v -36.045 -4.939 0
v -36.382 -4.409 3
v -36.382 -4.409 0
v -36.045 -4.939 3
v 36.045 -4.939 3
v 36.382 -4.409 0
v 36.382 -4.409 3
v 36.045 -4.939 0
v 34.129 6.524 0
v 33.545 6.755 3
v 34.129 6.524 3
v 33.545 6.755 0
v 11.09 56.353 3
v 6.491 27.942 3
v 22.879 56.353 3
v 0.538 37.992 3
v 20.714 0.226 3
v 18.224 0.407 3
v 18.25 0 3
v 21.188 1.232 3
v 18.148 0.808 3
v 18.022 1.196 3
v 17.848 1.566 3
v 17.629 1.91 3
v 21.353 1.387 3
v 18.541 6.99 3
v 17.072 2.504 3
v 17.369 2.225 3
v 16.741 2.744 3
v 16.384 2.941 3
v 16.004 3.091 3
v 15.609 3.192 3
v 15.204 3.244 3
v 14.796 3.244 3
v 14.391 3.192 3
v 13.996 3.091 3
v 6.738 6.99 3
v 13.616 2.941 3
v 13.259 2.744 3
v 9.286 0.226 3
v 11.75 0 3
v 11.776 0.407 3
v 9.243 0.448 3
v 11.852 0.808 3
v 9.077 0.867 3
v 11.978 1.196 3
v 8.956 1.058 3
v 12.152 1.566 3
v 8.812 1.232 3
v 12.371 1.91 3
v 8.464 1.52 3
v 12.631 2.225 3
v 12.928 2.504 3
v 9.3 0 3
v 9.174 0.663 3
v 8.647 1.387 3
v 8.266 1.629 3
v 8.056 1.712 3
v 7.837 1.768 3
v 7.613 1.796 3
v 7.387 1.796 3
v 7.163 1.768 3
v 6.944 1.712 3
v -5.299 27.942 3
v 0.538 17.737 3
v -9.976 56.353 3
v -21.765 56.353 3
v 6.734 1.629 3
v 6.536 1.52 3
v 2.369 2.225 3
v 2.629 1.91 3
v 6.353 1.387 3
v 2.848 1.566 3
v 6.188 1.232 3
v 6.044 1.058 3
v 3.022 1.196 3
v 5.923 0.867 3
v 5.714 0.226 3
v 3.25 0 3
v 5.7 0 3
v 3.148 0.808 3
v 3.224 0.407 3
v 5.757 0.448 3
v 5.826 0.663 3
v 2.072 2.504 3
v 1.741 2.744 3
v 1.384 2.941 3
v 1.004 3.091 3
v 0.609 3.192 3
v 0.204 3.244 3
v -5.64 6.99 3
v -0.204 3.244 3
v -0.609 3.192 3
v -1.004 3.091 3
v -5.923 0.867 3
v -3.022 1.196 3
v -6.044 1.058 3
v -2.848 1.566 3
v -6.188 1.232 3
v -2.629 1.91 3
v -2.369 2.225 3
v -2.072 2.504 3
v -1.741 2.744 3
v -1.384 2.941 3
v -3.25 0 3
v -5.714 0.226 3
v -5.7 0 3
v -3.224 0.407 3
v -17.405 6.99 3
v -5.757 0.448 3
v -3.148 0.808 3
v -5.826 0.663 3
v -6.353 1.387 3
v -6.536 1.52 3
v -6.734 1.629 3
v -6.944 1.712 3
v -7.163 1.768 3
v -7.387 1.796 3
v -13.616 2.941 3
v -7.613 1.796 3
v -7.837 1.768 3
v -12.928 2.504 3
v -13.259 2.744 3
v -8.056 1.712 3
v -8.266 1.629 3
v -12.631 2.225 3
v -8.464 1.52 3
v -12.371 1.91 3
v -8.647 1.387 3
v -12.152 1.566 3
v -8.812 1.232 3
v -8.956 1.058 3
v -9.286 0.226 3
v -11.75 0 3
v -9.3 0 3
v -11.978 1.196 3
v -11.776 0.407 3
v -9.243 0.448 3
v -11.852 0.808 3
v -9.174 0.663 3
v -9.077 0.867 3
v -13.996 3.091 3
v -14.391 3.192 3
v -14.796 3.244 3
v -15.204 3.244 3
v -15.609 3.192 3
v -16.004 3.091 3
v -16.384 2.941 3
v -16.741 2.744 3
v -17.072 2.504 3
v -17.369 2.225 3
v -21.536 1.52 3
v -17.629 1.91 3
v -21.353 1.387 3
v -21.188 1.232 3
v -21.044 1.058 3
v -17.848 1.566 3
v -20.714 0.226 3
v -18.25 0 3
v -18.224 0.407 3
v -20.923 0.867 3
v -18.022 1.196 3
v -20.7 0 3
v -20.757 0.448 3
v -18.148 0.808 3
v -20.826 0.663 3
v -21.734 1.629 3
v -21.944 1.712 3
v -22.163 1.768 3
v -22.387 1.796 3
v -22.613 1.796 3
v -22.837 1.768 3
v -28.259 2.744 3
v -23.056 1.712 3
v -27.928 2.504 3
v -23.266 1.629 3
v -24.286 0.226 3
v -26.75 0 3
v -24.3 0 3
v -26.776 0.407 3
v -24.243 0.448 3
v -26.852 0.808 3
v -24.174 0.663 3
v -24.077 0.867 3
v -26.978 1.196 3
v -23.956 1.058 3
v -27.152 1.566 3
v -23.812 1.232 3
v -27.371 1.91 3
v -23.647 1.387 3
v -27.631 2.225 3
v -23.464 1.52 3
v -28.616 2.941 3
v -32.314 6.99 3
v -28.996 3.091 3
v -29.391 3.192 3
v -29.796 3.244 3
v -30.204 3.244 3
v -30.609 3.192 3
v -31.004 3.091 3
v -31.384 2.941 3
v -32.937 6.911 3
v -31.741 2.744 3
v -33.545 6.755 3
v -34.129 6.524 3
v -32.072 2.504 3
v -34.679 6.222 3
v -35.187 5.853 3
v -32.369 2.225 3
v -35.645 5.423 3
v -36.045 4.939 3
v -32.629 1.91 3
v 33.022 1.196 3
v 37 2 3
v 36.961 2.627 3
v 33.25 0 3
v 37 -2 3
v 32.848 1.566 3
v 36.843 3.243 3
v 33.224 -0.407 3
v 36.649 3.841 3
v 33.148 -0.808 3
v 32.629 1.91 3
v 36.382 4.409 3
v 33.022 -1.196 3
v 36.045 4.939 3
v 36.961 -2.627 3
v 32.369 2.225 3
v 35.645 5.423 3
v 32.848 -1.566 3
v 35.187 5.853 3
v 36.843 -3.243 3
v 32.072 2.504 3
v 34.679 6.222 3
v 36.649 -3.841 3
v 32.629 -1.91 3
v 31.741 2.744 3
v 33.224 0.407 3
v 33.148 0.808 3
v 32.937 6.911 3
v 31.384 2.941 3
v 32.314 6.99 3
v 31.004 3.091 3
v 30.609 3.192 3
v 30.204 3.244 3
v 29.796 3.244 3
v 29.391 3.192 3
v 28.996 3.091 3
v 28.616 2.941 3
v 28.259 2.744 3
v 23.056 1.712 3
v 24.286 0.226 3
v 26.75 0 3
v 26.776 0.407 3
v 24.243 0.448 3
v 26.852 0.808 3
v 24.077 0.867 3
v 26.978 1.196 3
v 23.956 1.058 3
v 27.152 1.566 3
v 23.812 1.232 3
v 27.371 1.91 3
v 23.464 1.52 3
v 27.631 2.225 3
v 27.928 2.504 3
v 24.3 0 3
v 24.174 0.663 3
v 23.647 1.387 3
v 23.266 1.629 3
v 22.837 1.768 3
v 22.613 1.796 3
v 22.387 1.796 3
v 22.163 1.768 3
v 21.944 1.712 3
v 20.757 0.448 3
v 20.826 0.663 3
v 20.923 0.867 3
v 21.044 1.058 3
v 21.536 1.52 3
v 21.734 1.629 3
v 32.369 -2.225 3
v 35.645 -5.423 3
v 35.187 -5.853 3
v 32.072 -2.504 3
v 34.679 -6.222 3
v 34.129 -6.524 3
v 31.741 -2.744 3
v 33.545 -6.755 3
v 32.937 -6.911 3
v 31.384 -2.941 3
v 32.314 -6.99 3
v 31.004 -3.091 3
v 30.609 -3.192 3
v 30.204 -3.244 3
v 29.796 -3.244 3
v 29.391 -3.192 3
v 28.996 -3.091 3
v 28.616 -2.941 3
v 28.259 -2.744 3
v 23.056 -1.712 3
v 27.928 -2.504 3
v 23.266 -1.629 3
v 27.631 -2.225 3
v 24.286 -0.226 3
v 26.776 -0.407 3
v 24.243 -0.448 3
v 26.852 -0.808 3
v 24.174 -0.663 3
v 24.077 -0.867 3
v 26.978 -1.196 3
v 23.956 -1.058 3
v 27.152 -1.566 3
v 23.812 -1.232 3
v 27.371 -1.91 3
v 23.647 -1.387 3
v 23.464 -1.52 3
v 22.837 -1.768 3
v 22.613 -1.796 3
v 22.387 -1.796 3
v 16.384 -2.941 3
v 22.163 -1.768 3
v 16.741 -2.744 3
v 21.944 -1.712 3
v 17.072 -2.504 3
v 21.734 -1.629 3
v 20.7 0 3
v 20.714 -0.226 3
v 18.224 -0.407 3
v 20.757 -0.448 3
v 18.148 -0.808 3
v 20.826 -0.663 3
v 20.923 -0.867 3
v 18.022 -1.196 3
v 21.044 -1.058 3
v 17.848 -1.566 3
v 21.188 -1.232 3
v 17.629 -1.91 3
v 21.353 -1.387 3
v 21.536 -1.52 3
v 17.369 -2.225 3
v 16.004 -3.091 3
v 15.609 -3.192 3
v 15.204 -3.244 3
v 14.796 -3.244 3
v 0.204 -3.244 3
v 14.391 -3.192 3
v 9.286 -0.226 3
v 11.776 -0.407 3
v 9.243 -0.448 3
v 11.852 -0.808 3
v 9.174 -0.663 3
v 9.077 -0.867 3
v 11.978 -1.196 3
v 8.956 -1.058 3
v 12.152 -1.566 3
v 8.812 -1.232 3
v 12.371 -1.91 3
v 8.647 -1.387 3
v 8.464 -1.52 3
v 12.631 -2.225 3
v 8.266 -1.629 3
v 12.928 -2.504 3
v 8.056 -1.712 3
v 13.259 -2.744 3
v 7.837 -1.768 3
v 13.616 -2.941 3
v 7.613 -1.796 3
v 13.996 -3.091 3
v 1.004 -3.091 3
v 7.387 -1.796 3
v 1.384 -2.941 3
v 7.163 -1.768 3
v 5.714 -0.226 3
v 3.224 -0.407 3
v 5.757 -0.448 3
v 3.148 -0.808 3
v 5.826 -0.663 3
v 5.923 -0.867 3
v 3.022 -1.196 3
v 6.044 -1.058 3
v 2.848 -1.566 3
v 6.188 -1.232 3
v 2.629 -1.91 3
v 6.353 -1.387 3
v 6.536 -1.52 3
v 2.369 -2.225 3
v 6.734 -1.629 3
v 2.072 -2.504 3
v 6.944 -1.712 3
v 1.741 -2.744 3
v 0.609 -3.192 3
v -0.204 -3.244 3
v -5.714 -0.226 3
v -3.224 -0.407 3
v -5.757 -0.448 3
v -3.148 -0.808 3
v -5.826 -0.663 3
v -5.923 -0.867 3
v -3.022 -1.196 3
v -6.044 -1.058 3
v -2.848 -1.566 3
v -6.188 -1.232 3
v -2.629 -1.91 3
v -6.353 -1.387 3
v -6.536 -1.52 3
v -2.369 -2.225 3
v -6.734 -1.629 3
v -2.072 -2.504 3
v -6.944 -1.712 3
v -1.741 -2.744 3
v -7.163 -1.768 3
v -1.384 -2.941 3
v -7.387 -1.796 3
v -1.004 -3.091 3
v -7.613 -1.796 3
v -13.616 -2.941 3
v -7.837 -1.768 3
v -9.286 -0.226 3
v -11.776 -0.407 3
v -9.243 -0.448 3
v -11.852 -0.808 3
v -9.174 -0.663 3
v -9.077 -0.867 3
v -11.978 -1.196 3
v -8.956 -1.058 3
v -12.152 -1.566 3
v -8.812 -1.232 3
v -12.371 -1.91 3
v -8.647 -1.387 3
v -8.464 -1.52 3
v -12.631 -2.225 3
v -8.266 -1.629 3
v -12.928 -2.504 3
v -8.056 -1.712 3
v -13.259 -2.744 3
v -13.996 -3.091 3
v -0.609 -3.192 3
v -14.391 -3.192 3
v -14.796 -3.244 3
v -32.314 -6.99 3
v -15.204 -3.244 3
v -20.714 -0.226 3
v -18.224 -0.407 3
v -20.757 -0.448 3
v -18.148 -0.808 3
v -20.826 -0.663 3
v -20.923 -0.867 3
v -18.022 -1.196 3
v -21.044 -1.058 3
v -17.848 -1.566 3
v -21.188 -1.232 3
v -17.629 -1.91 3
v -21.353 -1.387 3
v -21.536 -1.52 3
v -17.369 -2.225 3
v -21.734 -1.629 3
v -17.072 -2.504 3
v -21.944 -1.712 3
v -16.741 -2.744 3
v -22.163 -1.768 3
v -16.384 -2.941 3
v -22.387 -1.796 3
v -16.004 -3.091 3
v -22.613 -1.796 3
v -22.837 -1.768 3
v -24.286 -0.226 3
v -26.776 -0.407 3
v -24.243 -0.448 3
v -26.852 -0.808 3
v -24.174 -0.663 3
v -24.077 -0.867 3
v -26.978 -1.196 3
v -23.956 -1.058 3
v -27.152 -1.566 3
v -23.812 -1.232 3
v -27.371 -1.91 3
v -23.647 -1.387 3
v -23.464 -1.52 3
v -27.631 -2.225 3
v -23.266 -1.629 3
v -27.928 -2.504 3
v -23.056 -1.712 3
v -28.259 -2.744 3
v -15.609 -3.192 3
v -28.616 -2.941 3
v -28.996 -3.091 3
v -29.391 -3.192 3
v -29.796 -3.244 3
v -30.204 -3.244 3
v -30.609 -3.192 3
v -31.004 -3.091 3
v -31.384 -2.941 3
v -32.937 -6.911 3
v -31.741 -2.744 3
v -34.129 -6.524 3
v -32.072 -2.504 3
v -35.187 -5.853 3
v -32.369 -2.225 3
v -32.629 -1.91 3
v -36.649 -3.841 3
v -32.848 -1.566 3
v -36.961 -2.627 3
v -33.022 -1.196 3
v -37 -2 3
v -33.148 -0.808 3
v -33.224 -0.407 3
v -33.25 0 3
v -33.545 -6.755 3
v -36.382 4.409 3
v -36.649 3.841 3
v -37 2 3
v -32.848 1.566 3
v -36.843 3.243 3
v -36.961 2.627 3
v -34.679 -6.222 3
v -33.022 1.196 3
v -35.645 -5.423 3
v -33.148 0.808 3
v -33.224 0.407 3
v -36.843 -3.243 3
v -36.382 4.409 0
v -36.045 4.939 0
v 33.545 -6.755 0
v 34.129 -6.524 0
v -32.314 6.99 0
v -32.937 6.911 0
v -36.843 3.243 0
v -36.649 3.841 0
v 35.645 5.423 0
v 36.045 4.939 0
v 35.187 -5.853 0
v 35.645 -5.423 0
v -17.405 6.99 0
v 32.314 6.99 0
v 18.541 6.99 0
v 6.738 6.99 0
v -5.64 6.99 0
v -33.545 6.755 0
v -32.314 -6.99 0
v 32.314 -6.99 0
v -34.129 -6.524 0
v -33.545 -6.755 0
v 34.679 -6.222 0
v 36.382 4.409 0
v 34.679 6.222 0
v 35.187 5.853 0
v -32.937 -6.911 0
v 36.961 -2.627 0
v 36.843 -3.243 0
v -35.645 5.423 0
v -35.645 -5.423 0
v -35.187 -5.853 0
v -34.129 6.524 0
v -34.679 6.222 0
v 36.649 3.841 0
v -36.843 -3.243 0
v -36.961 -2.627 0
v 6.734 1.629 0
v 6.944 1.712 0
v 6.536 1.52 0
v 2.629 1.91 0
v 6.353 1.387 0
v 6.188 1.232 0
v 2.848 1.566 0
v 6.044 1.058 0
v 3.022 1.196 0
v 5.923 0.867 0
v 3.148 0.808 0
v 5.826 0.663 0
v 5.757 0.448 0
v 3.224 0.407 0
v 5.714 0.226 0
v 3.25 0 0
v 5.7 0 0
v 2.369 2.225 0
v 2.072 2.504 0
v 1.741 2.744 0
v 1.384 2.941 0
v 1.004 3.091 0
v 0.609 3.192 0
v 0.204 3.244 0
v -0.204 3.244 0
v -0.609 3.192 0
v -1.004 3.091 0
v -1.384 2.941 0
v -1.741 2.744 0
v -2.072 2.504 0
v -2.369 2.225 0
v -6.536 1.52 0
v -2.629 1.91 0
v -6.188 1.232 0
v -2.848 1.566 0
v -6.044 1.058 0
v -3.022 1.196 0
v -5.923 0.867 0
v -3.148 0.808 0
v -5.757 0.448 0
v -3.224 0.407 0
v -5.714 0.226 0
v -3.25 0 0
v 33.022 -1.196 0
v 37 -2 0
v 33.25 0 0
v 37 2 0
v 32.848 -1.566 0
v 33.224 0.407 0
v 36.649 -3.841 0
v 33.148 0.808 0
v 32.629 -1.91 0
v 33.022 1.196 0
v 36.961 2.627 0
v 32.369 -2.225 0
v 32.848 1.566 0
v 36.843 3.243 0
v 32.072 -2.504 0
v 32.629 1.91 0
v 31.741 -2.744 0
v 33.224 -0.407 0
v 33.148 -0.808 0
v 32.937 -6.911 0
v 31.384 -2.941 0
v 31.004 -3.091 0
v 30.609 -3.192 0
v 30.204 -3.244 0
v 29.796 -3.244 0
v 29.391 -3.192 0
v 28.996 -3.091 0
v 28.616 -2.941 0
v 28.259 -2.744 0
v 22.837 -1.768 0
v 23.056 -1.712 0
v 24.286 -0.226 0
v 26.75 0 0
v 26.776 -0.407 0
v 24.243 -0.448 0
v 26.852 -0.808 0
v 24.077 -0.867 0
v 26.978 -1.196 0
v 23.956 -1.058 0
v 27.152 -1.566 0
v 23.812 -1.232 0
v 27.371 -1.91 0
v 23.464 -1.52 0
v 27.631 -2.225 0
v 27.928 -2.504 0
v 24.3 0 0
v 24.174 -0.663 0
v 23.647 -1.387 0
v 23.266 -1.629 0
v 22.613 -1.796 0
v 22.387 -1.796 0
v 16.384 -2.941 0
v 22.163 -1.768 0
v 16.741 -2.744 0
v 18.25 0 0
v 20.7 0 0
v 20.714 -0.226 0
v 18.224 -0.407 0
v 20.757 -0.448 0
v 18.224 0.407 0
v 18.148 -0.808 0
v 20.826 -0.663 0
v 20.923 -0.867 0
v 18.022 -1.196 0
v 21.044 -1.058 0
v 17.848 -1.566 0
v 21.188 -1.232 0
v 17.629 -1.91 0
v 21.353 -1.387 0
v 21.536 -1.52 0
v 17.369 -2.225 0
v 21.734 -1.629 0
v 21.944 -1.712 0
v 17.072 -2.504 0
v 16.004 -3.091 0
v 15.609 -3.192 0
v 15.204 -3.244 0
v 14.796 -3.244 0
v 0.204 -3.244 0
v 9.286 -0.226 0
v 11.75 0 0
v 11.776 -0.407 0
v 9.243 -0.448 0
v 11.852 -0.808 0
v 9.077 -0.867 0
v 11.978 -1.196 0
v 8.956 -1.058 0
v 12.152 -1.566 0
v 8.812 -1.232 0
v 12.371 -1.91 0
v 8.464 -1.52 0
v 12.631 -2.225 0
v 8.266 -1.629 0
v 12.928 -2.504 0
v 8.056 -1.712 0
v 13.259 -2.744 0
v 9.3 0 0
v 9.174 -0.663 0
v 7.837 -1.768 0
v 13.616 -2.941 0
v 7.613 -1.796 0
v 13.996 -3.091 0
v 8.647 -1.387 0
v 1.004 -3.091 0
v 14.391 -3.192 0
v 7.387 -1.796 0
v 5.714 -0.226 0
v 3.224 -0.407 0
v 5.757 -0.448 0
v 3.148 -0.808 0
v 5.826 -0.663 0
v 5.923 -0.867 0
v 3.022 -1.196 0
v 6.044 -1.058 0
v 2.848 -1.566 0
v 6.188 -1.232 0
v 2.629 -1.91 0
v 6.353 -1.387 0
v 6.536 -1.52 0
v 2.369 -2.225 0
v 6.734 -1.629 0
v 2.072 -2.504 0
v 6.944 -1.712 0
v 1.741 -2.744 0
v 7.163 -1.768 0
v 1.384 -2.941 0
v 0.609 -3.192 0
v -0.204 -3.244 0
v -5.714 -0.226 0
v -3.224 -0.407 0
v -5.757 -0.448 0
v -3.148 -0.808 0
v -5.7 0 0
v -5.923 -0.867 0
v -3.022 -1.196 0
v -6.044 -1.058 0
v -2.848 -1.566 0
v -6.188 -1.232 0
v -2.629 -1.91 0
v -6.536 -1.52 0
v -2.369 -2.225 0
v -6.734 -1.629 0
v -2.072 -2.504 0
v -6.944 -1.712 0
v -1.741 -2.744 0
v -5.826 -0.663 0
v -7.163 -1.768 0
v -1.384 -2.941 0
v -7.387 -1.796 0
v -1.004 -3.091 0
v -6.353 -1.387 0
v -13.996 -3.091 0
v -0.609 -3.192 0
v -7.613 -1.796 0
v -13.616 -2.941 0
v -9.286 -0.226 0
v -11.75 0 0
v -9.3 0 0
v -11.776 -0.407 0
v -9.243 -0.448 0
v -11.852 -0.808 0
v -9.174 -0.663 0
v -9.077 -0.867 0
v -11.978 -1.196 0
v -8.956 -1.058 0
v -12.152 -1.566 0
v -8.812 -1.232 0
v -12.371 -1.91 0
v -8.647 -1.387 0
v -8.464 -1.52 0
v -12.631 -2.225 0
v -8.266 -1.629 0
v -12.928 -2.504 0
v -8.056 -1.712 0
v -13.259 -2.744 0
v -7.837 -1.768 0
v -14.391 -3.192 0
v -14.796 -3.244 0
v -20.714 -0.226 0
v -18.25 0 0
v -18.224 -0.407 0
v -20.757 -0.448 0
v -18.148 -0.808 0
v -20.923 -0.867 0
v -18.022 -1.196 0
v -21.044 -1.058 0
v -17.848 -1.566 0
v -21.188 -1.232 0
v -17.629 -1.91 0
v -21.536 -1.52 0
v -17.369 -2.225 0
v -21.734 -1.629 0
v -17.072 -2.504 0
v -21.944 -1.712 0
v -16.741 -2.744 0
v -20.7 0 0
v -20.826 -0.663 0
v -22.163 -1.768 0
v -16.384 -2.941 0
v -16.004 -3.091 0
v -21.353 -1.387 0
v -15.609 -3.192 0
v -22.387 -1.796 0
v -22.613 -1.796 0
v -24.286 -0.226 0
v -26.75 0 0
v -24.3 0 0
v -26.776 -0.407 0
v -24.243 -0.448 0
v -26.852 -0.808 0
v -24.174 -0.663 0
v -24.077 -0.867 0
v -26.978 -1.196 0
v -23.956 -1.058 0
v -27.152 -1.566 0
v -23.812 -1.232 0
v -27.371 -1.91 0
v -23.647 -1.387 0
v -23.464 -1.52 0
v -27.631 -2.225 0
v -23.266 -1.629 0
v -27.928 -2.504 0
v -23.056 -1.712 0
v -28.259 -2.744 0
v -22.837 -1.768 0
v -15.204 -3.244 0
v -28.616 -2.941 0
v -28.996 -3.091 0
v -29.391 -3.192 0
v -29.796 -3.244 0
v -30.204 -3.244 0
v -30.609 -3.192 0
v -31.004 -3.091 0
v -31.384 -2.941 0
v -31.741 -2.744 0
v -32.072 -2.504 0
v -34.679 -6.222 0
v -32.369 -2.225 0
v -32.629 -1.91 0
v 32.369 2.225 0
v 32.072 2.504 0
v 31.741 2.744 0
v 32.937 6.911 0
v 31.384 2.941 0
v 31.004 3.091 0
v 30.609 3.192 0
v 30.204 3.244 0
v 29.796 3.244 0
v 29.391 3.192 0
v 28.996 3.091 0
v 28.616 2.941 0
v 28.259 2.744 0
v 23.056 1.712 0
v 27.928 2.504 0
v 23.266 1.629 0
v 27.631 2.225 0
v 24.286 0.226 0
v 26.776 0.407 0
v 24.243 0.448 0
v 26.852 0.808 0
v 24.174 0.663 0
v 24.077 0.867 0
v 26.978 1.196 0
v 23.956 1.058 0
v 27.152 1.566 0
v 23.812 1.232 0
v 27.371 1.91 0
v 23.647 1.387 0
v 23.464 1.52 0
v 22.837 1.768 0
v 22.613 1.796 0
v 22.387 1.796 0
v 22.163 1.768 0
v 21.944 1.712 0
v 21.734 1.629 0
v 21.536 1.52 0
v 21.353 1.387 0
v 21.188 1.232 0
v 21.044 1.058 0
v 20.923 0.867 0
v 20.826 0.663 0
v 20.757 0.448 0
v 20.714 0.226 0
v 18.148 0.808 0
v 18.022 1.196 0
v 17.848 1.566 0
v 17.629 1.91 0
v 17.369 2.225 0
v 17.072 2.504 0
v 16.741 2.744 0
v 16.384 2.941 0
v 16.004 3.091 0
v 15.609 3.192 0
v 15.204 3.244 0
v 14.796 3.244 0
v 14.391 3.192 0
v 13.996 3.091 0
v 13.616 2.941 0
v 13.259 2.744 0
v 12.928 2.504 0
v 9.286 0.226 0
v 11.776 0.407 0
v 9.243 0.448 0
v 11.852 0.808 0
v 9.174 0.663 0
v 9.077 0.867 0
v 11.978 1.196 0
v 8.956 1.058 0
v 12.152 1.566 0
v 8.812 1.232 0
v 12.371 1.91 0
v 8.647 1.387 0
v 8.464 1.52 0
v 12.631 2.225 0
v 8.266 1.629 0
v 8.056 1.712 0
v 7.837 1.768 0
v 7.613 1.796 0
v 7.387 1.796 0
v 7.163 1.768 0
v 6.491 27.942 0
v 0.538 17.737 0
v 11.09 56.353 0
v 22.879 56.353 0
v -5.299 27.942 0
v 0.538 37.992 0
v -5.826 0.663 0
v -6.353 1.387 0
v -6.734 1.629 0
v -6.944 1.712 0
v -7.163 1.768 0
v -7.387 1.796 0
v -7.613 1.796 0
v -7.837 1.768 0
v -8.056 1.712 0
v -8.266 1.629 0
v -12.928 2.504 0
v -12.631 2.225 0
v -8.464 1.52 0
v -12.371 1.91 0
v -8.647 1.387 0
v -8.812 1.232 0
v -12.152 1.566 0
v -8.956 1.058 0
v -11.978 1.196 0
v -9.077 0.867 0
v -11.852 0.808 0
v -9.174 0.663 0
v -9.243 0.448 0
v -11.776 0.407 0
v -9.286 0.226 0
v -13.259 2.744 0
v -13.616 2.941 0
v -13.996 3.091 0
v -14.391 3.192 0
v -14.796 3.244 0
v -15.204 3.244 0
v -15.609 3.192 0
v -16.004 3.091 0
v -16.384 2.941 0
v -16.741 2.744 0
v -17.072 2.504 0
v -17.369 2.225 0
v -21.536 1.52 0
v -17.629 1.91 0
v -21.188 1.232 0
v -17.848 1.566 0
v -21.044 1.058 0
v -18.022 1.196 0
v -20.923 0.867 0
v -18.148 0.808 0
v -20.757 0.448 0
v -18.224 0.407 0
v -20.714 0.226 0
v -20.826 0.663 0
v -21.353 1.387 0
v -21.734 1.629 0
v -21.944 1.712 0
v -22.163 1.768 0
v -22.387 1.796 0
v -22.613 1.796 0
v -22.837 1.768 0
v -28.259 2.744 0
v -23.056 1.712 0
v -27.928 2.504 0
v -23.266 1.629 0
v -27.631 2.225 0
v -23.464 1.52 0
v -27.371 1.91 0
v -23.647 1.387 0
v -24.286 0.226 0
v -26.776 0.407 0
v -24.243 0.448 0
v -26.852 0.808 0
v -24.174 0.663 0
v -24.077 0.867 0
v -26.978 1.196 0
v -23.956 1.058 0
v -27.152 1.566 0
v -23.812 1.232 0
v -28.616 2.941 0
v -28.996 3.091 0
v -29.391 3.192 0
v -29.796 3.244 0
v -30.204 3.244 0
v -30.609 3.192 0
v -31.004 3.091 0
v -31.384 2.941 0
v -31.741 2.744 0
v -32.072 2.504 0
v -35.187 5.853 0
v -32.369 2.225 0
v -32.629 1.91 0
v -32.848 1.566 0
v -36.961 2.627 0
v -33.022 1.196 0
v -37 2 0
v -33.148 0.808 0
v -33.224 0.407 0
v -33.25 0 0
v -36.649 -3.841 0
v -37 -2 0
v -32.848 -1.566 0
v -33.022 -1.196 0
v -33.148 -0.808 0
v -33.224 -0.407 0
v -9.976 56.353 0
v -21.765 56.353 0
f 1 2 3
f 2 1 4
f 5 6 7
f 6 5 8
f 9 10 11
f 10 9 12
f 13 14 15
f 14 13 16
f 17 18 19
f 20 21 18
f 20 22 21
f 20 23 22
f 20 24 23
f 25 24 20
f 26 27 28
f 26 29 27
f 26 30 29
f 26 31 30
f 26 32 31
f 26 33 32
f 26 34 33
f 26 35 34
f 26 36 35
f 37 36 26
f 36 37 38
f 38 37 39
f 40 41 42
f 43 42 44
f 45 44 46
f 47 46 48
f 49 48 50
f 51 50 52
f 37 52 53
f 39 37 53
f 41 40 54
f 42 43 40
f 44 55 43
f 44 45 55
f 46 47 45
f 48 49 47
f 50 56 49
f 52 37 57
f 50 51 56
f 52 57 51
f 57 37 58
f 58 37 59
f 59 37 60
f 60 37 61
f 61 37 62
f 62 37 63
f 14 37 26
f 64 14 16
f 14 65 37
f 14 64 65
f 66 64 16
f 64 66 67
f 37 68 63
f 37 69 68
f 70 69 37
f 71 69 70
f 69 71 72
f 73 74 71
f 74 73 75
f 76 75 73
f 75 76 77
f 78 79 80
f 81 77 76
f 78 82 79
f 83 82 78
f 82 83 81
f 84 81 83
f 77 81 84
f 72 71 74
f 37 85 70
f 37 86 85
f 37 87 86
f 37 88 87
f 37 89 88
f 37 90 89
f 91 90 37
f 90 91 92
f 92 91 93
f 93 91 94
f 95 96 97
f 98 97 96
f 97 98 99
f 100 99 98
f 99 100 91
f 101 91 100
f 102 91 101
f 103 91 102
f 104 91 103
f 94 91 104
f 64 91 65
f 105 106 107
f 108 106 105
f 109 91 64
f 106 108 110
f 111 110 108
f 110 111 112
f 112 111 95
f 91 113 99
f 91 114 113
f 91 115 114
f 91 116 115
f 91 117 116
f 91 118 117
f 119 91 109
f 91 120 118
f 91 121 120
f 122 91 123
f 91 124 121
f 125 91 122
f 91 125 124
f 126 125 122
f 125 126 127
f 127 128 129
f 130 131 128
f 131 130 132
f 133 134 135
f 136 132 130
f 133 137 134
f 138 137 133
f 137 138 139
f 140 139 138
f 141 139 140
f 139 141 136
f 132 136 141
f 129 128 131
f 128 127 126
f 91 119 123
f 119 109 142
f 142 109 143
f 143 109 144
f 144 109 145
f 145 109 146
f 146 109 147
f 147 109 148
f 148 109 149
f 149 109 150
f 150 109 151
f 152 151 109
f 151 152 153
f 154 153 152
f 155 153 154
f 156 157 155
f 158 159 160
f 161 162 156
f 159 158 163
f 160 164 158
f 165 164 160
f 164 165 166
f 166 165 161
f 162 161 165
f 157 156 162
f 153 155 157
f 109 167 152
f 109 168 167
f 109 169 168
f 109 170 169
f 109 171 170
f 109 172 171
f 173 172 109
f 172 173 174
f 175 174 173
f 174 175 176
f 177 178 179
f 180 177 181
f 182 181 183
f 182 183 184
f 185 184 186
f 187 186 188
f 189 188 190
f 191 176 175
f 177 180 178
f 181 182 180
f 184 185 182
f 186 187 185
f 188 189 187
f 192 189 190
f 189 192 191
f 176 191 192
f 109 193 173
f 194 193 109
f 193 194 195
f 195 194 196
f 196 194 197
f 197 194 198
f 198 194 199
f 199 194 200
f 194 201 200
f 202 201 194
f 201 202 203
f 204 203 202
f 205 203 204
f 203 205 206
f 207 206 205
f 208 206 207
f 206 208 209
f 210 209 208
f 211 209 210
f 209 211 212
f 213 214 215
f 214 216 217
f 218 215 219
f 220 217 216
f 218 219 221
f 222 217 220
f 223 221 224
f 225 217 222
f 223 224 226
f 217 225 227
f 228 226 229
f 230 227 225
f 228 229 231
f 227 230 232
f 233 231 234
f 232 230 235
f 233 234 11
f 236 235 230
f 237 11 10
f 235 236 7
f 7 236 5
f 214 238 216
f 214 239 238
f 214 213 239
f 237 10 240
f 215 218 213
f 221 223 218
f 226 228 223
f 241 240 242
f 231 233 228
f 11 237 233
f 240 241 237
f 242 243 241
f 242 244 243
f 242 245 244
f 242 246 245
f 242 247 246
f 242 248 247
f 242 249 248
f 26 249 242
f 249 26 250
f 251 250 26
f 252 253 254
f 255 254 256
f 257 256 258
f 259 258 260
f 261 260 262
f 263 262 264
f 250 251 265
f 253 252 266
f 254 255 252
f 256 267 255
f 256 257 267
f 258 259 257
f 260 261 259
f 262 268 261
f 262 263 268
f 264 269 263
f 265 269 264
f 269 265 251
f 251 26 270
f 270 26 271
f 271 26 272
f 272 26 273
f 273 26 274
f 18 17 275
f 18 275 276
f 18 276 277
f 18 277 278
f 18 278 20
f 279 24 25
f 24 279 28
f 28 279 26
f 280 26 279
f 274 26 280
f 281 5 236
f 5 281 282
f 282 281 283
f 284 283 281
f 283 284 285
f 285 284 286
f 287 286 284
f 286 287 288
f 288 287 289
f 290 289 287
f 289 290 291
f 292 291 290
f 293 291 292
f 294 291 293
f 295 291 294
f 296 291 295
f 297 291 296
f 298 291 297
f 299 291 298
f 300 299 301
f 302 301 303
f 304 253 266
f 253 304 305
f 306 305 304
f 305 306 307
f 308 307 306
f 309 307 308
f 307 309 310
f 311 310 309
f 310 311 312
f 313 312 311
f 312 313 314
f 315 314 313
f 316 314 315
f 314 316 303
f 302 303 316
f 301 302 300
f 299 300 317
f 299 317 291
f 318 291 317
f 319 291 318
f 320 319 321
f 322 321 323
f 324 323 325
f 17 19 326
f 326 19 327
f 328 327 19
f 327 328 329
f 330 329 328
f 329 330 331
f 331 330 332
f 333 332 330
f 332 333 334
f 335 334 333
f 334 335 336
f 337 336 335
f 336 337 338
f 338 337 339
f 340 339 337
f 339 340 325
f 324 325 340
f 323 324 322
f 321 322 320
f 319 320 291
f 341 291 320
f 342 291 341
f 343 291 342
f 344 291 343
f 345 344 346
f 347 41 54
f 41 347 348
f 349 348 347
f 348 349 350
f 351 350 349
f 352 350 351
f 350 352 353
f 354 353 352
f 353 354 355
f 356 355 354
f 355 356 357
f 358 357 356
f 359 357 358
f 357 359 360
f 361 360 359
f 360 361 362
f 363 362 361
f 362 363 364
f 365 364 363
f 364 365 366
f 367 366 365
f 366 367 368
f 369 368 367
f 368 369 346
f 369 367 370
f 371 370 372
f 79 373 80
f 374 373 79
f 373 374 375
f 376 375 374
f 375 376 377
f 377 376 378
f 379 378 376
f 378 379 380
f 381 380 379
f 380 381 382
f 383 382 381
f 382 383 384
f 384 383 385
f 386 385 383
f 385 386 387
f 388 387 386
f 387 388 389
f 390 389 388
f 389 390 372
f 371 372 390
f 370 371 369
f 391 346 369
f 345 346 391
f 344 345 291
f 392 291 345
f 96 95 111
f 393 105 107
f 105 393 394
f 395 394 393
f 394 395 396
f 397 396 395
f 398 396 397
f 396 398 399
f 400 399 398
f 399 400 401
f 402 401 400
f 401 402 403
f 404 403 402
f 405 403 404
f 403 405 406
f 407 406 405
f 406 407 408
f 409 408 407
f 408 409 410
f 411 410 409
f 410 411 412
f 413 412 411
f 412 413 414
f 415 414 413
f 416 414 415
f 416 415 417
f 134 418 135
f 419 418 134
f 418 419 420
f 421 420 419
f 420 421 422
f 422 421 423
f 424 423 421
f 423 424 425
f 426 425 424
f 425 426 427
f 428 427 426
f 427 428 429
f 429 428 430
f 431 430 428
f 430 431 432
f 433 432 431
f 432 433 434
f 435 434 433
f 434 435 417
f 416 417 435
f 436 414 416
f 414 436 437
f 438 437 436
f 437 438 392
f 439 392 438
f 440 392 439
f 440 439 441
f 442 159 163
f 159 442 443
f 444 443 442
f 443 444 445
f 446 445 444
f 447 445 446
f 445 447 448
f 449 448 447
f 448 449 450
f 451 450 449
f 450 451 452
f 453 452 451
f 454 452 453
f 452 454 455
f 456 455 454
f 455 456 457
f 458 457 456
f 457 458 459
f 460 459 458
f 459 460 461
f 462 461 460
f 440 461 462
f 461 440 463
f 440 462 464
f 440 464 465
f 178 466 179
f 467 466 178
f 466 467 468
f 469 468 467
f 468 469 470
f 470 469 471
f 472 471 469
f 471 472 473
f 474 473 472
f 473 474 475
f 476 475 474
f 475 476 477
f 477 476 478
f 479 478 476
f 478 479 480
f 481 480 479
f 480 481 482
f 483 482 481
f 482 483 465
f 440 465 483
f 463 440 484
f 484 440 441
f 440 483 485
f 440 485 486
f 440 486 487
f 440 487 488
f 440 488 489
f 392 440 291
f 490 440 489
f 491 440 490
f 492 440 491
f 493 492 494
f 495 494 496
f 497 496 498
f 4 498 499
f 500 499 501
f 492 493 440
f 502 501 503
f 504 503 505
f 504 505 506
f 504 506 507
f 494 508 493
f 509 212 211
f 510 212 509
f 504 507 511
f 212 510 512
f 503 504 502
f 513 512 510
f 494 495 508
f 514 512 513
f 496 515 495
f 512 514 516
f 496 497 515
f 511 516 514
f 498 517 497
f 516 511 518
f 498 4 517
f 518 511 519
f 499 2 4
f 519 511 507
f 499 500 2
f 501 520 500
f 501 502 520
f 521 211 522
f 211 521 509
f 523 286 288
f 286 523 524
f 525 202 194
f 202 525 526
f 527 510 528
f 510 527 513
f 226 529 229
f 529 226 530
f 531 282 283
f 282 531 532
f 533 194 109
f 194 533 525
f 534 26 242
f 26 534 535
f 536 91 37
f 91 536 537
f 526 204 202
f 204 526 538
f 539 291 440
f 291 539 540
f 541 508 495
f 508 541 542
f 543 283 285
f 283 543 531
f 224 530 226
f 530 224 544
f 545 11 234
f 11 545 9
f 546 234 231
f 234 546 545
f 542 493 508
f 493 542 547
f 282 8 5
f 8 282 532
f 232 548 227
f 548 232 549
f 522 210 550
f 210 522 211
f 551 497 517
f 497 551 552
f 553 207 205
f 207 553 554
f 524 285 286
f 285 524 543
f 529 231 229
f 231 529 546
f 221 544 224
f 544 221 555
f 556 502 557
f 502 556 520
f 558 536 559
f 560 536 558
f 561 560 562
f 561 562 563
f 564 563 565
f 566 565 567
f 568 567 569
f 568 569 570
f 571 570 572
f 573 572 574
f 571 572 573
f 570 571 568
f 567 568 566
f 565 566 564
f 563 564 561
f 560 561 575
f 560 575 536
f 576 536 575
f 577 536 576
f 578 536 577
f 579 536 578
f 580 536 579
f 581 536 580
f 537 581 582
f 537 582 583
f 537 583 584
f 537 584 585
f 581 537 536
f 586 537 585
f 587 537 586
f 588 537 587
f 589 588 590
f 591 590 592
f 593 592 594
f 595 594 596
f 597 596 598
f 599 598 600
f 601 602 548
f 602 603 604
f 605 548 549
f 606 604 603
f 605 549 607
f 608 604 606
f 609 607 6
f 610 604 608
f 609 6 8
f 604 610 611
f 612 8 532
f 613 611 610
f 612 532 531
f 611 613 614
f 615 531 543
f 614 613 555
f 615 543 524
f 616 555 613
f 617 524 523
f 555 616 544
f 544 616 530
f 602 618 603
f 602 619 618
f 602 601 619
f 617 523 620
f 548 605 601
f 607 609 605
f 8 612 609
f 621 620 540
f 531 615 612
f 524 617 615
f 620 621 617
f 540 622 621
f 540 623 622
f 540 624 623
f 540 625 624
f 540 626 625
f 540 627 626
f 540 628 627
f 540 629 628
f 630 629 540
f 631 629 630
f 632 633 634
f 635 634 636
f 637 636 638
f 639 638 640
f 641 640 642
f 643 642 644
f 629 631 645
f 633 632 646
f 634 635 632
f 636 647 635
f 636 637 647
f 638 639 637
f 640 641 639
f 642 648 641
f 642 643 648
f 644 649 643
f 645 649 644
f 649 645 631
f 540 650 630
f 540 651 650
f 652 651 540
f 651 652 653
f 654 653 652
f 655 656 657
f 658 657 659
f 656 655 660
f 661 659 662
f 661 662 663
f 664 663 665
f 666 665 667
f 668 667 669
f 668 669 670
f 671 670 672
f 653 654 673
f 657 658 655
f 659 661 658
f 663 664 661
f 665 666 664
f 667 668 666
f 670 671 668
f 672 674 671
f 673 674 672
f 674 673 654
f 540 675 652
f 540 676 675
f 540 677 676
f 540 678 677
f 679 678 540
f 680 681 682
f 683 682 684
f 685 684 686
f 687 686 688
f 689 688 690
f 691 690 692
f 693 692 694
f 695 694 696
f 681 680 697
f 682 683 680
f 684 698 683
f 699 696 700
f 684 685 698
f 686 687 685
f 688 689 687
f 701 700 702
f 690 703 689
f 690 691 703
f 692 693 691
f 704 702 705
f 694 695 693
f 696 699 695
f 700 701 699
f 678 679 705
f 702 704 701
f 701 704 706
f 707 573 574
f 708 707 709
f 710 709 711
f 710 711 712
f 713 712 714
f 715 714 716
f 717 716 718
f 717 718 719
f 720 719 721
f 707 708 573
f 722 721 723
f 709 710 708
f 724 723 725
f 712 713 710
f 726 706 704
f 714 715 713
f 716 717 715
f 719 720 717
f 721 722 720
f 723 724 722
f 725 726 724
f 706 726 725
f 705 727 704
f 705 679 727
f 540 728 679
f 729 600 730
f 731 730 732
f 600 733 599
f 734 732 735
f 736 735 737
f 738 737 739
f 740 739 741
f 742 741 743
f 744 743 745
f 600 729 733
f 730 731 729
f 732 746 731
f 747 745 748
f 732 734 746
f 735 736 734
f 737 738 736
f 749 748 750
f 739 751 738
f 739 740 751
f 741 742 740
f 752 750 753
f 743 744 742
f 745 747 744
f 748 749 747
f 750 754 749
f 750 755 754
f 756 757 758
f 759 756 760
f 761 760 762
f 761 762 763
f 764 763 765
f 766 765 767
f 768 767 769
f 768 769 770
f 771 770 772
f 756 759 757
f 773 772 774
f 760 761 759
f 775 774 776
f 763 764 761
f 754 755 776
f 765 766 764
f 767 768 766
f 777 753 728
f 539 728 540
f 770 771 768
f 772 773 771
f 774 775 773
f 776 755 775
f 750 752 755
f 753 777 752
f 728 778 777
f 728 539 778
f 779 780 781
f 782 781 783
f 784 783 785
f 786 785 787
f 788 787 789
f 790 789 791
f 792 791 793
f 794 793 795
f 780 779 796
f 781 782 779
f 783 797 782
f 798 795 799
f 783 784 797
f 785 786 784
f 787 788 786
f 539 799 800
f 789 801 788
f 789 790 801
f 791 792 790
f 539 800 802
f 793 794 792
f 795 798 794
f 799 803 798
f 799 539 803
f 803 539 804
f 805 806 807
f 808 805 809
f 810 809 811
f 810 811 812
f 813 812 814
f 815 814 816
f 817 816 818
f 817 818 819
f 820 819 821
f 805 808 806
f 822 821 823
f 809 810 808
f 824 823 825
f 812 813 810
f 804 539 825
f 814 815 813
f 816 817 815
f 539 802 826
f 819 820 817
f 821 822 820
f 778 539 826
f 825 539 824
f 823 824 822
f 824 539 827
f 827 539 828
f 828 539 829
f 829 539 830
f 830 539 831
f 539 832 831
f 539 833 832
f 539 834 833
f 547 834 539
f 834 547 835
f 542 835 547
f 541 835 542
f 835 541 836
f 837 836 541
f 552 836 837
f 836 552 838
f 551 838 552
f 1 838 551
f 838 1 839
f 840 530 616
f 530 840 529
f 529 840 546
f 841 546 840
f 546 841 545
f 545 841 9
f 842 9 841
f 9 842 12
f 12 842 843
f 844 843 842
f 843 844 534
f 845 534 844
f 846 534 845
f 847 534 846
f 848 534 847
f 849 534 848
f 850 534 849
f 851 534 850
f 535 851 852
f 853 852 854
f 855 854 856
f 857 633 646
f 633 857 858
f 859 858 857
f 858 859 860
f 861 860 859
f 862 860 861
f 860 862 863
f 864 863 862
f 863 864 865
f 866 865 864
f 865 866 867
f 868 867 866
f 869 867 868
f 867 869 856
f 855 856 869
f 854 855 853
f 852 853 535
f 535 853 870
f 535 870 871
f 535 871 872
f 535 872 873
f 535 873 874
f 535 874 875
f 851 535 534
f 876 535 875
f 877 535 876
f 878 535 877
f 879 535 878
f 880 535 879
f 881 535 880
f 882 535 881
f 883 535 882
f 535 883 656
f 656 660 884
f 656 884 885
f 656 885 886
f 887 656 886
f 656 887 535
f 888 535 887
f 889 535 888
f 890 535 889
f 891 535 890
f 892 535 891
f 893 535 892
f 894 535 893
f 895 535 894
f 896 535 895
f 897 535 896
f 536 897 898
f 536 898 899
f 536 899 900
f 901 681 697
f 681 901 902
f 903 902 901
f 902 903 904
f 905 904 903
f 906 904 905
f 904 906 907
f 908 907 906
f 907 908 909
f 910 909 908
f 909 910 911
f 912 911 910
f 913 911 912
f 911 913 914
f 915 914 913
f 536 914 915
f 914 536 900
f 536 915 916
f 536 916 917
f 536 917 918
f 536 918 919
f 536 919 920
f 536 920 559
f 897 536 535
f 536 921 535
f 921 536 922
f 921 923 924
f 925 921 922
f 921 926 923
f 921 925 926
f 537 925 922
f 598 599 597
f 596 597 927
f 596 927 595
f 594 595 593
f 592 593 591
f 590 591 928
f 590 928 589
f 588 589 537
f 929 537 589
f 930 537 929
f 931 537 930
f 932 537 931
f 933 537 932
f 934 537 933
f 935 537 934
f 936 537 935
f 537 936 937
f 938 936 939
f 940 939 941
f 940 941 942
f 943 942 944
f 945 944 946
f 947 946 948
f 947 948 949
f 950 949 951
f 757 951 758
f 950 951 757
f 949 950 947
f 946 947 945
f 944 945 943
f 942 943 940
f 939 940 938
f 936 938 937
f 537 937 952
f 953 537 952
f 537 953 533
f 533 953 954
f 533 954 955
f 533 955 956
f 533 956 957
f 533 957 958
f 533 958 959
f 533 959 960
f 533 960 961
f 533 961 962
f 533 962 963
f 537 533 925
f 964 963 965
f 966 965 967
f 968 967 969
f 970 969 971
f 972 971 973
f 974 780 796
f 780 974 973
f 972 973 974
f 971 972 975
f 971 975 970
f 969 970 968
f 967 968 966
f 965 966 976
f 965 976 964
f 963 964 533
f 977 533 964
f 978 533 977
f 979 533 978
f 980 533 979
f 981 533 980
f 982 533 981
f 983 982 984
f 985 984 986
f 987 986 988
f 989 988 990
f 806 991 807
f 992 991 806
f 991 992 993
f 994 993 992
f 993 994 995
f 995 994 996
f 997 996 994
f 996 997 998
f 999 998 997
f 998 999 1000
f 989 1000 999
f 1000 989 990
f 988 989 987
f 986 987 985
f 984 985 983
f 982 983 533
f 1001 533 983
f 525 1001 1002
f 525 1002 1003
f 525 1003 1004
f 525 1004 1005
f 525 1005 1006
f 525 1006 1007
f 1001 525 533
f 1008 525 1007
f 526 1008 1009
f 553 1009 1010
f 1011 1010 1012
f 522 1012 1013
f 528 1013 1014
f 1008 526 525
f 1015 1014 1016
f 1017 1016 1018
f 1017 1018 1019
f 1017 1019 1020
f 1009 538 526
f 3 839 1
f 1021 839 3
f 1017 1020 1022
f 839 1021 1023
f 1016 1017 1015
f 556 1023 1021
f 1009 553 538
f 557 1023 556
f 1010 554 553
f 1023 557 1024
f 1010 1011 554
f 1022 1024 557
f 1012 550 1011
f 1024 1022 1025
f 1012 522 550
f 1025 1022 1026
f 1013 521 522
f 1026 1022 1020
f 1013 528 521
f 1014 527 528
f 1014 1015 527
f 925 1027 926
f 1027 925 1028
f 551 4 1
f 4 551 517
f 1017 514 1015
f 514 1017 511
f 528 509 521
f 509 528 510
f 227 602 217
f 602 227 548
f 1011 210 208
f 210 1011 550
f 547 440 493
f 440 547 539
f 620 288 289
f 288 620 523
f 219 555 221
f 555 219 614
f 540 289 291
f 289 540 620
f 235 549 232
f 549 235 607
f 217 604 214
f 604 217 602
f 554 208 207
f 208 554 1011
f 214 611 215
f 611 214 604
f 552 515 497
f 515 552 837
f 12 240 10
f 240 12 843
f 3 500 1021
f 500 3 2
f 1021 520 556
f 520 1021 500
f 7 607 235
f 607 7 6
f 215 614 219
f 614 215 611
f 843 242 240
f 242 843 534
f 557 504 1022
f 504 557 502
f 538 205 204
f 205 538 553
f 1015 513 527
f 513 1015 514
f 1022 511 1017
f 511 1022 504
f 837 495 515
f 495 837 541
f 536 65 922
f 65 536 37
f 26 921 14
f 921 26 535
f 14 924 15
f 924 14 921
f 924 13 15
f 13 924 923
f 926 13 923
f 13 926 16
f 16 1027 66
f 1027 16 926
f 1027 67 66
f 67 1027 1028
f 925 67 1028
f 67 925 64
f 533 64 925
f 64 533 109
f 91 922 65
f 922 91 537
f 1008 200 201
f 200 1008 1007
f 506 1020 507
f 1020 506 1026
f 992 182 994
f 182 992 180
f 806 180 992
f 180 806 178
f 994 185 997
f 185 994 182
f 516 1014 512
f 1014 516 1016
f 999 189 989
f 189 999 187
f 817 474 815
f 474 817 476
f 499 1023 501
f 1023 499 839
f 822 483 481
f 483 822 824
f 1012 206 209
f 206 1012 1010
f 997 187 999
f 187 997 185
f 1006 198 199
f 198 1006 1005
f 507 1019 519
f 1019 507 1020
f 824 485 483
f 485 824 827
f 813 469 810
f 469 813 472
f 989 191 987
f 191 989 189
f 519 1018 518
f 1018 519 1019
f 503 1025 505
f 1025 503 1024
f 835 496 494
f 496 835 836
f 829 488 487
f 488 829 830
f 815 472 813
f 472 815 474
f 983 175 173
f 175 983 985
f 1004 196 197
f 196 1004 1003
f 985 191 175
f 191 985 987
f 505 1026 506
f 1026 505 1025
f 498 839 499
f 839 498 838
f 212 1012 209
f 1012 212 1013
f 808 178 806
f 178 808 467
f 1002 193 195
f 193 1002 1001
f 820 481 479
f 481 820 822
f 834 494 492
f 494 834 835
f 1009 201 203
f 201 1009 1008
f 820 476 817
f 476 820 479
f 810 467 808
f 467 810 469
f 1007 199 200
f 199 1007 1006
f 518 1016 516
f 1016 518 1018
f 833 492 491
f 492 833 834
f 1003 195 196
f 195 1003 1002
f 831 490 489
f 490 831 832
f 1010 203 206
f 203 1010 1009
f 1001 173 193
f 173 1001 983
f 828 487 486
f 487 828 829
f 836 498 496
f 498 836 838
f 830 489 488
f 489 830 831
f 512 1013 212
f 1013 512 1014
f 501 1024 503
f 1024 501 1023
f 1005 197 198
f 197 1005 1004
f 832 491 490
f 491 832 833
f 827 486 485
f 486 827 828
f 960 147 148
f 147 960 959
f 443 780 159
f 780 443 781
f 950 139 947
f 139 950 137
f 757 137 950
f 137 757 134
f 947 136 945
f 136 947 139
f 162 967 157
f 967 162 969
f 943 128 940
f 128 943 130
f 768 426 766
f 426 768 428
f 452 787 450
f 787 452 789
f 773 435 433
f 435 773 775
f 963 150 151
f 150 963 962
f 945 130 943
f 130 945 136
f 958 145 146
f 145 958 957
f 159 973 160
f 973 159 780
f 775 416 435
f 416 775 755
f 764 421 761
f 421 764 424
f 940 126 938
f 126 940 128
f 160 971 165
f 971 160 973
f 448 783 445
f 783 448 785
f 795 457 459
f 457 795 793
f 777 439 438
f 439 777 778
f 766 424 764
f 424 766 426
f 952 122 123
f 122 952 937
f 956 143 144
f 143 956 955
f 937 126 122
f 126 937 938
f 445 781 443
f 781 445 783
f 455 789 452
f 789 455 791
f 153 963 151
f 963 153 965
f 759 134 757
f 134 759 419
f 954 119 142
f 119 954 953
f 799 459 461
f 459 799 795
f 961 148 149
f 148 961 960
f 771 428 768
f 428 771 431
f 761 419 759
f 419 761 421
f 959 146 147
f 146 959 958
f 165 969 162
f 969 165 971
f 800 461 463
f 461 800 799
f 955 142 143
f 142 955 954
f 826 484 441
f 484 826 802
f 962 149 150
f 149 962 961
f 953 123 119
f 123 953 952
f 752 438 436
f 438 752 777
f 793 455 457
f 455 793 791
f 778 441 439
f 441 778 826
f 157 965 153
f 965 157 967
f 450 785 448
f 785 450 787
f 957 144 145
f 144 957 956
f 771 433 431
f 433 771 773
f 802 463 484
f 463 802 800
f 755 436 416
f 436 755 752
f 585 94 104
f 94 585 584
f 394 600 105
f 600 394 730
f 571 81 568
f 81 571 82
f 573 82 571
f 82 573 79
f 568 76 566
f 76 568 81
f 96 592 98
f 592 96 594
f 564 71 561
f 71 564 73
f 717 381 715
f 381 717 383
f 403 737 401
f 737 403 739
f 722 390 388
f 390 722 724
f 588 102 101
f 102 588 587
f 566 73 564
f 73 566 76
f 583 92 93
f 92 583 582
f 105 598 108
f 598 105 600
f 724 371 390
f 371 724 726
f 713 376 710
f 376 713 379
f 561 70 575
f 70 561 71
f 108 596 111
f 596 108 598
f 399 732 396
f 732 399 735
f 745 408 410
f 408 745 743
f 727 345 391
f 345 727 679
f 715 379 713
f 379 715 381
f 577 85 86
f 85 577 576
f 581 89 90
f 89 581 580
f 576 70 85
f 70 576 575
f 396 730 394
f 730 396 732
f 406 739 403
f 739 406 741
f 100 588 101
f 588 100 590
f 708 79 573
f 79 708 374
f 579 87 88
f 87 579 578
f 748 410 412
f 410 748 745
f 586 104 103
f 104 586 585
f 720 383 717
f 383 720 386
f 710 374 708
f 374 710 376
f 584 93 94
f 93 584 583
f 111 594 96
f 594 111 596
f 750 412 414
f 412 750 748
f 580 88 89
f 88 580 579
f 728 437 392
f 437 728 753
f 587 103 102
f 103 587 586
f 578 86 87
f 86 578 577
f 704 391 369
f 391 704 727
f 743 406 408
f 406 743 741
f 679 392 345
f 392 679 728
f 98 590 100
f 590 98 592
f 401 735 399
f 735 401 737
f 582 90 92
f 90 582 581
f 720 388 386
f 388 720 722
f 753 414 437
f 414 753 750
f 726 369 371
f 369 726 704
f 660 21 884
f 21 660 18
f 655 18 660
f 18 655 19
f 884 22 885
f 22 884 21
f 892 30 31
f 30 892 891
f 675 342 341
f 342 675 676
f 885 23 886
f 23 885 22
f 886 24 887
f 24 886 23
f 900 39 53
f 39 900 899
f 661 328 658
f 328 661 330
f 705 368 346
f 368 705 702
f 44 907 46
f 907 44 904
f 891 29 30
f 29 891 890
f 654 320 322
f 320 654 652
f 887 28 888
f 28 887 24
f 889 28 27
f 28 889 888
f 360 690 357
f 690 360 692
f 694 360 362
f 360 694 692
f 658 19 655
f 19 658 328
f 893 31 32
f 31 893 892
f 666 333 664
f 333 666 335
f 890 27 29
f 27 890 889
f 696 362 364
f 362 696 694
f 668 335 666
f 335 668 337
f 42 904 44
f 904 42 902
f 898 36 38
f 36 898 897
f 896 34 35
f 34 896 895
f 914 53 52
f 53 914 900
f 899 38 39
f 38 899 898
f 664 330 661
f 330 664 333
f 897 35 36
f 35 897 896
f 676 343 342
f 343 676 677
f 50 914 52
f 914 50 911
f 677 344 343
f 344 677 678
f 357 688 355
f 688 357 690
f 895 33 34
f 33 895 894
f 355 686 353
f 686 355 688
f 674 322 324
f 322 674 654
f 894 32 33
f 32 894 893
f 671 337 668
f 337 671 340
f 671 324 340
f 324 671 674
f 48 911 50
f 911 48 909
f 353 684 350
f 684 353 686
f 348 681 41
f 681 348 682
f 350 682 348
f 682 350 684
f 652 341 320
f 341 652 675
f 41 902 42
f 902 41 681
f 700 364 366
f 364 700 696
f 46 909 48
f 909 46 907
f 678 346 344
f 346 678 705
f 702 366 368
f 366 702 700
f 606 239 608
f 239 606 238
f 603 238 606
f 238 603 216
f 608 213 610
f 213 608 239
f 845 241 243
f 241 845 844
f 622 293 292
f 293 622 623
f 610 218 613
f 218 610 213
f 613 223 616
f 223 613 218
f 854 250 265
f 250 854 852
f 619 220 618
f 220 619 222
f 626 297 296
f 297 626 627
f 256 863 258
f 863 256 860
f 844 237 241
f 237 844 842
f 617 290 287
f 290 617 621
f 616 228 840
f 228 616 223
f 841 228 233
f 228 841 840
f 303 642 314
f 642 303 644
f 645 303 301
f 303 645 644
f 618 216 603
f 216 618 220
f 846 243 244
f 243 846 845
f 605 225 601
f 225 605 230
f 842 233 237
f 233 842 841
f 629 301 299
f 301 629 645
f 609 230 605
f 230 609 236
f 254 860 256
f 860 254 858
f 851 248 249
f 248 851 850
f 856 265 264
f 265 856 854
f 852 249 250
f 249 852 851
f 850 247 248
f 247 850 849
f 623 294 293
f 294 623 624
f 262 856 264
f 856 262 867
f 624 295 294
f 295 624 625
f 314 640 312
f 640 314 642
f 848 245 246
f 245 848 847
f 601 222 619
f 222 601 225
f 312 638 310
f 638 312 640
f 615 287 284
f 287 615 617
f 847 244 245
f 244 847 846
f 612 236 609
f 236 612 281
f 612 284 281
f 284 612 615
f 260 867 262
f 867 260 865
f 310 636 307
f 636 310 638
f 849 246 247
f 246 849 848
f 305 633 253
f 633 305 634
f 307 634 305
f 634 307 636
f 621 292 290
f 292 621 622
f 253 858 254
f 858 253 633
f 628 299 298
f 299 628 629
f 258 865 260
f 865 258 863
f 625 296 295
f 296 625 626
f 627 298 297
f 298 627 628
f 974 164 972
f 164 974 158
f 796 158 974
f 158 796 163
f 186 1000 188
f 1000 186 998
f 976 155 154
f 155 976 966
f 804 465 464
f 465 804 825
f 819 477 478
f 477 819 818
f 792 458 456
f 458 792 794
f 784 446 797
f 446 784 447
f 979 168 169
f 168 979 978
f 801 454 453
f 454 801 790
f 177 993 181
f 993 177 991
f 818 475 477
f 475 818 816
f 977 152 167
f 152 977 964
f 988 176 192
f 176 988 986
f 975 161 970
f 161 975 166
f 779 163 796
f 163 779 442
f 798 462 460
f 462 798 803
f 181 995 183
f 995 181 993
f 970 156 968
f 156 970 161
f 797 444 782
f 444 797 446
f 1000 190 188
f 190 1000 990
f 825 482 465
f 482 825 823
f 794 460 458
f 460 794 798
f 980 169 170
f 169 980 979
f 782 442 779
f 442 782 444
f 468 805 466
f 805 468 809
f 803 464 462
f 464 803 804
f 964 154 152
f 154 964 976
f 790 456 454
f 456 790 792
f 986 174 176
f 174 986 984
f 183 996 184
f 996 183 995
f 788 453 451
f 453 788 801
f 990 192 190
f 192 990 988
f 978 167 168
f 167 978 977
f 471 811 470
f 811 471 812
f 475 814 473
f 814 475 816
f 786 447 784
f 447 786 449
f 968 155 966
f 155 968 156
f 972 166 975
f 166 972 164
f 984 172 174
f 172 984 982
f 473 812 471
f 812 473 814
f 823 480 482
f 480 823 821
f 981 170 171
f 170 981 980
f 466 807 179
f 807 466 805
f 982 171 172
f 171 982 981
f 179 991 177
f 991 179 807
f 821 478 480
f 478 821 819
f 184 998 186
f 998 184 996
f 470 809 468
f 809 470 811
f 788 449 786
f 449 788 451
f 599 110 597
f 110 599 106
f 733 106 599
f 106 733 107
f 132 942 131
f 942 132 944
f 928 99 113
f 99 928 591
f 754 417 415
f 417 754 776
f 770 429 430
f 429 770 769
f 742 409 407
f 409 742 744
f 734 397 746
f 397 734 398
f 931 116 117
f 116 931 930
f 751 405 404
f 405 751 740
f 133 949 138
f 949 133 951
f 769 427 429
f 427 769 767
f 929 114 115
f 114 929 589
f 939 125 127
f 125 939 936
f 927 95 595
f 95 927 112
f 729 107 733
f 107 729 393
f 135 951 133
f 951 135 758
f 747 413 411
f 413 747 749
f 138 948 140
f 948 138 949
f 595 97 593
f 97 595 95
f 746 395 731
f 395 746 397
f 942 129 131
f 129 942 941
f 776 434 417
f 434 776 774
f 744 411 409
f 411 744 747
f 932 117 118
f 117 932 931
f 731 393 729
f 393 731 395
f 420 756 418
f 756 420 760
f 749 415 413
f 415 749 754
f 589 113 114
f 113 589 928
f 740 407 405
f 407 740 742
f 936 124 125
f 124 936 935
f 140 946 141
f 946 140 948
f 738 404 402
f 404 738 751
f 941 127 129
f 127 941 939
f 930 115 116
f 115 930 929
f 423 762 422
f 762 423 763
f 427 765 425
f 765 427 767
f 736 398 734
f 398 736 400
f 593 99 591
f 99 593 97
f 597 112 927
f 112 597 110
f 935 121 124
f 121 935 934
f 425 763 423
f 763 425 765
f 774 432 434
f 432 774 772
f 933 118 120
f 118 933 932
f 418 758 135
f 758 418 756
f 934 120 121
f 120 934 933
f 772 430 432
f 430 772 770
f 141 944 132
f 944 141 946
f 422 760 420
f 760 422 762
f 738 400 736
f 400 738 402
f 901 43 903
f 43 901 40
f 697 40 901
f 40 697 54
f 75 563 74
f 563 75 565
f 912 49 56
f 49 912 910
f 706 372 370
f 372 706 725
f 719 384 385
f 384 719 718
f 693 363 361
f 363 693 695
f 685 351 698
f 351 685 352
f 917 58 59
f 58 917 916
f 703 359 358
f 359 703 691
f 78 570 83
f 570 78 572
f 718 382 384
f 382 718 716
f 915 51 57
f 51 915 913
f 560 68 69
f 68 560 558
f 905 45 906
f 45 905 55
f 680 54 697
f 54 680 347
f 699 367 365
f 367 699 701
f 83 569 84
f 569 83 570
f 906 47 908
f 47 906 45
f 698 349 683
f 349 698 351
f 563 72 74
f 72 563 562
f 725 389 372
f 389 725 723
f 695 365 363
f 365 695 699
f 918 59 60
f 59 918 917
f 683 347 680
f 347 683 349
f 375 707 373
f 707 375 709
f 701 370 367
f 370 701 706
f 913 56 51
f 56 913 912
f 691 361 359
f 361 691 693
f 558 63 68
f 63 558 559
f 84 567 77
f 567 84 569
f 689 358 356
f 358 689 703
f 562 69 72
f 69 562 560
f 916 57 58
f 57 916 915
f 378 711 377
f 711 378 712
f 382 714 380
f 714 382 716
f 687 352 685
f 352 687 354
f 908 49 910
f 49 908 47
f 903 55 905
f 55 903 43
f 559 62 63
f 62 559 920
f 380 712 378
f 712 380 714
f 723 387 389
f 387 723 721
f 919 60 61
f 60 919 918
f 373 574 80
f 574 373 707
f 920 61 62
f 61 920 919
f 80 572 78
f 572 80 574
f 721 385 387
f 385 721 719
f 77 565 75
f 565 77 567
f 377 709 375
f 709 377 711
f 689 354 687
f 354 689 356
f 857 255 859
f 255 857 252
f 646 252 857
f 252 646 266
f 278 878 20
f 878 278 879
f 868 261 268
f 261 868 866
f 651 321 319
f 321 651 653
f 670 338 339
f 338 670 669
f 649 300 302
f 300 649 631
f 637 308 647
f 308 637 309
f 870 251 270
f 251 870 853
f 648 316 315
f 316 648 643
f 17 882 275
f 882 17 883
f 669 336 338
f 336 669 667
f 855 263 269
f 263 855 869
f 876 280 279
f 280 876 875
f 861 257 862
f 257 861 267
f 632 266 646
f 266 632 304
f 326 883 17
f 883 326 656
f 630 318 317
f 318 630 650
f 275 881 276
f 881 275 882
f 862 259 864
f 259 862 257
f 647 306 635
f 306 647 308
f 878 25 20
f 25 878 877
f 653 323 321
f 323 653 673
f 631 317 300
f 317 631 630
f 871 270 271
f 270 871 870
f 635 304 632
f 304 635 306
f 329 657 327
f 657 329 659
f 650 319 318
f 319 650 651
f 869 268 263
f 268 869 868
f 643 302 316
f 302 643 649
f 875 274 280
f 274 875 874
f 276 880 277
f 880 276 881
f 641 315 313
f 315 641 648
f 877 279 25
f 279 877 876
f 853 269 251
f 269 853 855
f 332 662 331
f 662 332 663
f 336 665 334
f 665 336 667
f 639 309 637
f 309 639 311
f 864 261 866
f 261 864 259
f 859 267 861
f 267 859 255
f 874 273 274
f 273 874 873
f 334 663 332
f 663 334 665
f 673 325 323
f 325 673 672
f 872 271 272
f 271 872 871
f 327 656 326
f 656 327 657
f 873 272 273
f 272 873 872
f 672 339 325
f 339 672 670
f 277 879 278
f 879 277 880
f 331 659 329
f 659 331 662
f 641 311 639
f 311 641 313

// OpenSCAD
$fn = 50;


difference() {
	union() {
		hull() {
			translate(v = [-32.0000000000, 2.0000000000, 0]) {
				cylinder(h = 3, r = 5);
			}
			translate(v = [32.0000000000, 2.0000000000, 0]) {
				cylinder(h = 3, r = 5);
			}
			translate(v = [-32.0000000000, -2.0000000000, 0]) {
				cylinder(h = 3, r = 5);
			}
			translate(v = [32.0000000000, -2.0000000000, 0]) {
				cylinder(h = 3, r = 5);
			}
		}
		translate(v = [0, 55, 0]) {
			linear_extrude(height = 3) {
				text(font = "DejaVu Sans Mono:style=Bold", halign = "center", size = 57.0000000000, text = "X", valign = "top");
			}
		}
	}
	union() {
		translate(v = [-30.0000000000, 0.0000000000, 0]) {
			translate(v = [0, 0, -100]) {
				cylinder(h = 200, r = 3.2500000000);
			}
		}
		translate(v = [-15.0000000000, 0.0000000000, 0]) {
			translate(v = [0, 0, -100]) {
				cylinder(h = 200, r = 3.2500000000);
			}
		}
		translate(v = [0, 0, -100]) {
			cylinder(h = 200, r = 3.2500000000);
		}
		translate(v = [15.0000000000, 0.0000000000, 0]) {
			translate(v = [0, 0, -100]) {
				cylinder(h = 200, r = 3.2500000000);
			}
		}
		translate(v = [30.0000000000, 0.0000000000, 0]) {
			translate(v = [0, 0, -100]) {
				cylinder(h = 200, r = 3.2500000000);
			}
		}
		translate(v = [-30.0000000000, 0.0000000000, 0]) {
			translate(v = [0, 0, -100]) {
				cylinder(h = 200, r = 1.8000000000);
			}
		}
		translate(v = [-22.5000000000, 0.0000000000, 0]) {
			translate(v = [0, 0, -100]) {
				cylinder(h = 200, r = 1.8000000000);
			}
		}
		translate(v = [-15.0000000000, 0.0000000000, 0]) {
			translate(v = [0, 0, -100]) {
				cylinder(h = 200, r = 1.8000000000);
			}
		}
		translate(v = [-7.5000000000, 0.0000000000, 0]) {
			translate(v = [0, 0, -100]) {
				cylinder(h = 200, r = 1.8000000000);
			}
		}
		translate(v = [0, 0, -100]) {
			cylinder(h = 200, r = 1.8000000000);
		}
		translate(v = [7.5000000000, 0.0000000000, 0]) {
			translate(v = [0, 0, -100]) {
				cylinder(h = 200, r = 1.8000000000);
			}
		}
		translate(v = [15.0000000000, 0.0000000000, 0]) {
			translate(v = [0, 0, -100]) {
				cylinder(h = 200, r = 1.8000000000);
			}
		}
		translate(v = [22.5000000000, 0.0000000000, 0]) {
			translate(v = [0, 0, -100]) {
				cylinder(h = 200, r = 1.8000000000);
			}
		}
		translate(v = [30.0000000000, 0.0000000000, 0]) {
			translate(v = [0, 0, -100]) {
				cylinder(h = 200, r = 1.8000000000);
			}
		}
	}
}
